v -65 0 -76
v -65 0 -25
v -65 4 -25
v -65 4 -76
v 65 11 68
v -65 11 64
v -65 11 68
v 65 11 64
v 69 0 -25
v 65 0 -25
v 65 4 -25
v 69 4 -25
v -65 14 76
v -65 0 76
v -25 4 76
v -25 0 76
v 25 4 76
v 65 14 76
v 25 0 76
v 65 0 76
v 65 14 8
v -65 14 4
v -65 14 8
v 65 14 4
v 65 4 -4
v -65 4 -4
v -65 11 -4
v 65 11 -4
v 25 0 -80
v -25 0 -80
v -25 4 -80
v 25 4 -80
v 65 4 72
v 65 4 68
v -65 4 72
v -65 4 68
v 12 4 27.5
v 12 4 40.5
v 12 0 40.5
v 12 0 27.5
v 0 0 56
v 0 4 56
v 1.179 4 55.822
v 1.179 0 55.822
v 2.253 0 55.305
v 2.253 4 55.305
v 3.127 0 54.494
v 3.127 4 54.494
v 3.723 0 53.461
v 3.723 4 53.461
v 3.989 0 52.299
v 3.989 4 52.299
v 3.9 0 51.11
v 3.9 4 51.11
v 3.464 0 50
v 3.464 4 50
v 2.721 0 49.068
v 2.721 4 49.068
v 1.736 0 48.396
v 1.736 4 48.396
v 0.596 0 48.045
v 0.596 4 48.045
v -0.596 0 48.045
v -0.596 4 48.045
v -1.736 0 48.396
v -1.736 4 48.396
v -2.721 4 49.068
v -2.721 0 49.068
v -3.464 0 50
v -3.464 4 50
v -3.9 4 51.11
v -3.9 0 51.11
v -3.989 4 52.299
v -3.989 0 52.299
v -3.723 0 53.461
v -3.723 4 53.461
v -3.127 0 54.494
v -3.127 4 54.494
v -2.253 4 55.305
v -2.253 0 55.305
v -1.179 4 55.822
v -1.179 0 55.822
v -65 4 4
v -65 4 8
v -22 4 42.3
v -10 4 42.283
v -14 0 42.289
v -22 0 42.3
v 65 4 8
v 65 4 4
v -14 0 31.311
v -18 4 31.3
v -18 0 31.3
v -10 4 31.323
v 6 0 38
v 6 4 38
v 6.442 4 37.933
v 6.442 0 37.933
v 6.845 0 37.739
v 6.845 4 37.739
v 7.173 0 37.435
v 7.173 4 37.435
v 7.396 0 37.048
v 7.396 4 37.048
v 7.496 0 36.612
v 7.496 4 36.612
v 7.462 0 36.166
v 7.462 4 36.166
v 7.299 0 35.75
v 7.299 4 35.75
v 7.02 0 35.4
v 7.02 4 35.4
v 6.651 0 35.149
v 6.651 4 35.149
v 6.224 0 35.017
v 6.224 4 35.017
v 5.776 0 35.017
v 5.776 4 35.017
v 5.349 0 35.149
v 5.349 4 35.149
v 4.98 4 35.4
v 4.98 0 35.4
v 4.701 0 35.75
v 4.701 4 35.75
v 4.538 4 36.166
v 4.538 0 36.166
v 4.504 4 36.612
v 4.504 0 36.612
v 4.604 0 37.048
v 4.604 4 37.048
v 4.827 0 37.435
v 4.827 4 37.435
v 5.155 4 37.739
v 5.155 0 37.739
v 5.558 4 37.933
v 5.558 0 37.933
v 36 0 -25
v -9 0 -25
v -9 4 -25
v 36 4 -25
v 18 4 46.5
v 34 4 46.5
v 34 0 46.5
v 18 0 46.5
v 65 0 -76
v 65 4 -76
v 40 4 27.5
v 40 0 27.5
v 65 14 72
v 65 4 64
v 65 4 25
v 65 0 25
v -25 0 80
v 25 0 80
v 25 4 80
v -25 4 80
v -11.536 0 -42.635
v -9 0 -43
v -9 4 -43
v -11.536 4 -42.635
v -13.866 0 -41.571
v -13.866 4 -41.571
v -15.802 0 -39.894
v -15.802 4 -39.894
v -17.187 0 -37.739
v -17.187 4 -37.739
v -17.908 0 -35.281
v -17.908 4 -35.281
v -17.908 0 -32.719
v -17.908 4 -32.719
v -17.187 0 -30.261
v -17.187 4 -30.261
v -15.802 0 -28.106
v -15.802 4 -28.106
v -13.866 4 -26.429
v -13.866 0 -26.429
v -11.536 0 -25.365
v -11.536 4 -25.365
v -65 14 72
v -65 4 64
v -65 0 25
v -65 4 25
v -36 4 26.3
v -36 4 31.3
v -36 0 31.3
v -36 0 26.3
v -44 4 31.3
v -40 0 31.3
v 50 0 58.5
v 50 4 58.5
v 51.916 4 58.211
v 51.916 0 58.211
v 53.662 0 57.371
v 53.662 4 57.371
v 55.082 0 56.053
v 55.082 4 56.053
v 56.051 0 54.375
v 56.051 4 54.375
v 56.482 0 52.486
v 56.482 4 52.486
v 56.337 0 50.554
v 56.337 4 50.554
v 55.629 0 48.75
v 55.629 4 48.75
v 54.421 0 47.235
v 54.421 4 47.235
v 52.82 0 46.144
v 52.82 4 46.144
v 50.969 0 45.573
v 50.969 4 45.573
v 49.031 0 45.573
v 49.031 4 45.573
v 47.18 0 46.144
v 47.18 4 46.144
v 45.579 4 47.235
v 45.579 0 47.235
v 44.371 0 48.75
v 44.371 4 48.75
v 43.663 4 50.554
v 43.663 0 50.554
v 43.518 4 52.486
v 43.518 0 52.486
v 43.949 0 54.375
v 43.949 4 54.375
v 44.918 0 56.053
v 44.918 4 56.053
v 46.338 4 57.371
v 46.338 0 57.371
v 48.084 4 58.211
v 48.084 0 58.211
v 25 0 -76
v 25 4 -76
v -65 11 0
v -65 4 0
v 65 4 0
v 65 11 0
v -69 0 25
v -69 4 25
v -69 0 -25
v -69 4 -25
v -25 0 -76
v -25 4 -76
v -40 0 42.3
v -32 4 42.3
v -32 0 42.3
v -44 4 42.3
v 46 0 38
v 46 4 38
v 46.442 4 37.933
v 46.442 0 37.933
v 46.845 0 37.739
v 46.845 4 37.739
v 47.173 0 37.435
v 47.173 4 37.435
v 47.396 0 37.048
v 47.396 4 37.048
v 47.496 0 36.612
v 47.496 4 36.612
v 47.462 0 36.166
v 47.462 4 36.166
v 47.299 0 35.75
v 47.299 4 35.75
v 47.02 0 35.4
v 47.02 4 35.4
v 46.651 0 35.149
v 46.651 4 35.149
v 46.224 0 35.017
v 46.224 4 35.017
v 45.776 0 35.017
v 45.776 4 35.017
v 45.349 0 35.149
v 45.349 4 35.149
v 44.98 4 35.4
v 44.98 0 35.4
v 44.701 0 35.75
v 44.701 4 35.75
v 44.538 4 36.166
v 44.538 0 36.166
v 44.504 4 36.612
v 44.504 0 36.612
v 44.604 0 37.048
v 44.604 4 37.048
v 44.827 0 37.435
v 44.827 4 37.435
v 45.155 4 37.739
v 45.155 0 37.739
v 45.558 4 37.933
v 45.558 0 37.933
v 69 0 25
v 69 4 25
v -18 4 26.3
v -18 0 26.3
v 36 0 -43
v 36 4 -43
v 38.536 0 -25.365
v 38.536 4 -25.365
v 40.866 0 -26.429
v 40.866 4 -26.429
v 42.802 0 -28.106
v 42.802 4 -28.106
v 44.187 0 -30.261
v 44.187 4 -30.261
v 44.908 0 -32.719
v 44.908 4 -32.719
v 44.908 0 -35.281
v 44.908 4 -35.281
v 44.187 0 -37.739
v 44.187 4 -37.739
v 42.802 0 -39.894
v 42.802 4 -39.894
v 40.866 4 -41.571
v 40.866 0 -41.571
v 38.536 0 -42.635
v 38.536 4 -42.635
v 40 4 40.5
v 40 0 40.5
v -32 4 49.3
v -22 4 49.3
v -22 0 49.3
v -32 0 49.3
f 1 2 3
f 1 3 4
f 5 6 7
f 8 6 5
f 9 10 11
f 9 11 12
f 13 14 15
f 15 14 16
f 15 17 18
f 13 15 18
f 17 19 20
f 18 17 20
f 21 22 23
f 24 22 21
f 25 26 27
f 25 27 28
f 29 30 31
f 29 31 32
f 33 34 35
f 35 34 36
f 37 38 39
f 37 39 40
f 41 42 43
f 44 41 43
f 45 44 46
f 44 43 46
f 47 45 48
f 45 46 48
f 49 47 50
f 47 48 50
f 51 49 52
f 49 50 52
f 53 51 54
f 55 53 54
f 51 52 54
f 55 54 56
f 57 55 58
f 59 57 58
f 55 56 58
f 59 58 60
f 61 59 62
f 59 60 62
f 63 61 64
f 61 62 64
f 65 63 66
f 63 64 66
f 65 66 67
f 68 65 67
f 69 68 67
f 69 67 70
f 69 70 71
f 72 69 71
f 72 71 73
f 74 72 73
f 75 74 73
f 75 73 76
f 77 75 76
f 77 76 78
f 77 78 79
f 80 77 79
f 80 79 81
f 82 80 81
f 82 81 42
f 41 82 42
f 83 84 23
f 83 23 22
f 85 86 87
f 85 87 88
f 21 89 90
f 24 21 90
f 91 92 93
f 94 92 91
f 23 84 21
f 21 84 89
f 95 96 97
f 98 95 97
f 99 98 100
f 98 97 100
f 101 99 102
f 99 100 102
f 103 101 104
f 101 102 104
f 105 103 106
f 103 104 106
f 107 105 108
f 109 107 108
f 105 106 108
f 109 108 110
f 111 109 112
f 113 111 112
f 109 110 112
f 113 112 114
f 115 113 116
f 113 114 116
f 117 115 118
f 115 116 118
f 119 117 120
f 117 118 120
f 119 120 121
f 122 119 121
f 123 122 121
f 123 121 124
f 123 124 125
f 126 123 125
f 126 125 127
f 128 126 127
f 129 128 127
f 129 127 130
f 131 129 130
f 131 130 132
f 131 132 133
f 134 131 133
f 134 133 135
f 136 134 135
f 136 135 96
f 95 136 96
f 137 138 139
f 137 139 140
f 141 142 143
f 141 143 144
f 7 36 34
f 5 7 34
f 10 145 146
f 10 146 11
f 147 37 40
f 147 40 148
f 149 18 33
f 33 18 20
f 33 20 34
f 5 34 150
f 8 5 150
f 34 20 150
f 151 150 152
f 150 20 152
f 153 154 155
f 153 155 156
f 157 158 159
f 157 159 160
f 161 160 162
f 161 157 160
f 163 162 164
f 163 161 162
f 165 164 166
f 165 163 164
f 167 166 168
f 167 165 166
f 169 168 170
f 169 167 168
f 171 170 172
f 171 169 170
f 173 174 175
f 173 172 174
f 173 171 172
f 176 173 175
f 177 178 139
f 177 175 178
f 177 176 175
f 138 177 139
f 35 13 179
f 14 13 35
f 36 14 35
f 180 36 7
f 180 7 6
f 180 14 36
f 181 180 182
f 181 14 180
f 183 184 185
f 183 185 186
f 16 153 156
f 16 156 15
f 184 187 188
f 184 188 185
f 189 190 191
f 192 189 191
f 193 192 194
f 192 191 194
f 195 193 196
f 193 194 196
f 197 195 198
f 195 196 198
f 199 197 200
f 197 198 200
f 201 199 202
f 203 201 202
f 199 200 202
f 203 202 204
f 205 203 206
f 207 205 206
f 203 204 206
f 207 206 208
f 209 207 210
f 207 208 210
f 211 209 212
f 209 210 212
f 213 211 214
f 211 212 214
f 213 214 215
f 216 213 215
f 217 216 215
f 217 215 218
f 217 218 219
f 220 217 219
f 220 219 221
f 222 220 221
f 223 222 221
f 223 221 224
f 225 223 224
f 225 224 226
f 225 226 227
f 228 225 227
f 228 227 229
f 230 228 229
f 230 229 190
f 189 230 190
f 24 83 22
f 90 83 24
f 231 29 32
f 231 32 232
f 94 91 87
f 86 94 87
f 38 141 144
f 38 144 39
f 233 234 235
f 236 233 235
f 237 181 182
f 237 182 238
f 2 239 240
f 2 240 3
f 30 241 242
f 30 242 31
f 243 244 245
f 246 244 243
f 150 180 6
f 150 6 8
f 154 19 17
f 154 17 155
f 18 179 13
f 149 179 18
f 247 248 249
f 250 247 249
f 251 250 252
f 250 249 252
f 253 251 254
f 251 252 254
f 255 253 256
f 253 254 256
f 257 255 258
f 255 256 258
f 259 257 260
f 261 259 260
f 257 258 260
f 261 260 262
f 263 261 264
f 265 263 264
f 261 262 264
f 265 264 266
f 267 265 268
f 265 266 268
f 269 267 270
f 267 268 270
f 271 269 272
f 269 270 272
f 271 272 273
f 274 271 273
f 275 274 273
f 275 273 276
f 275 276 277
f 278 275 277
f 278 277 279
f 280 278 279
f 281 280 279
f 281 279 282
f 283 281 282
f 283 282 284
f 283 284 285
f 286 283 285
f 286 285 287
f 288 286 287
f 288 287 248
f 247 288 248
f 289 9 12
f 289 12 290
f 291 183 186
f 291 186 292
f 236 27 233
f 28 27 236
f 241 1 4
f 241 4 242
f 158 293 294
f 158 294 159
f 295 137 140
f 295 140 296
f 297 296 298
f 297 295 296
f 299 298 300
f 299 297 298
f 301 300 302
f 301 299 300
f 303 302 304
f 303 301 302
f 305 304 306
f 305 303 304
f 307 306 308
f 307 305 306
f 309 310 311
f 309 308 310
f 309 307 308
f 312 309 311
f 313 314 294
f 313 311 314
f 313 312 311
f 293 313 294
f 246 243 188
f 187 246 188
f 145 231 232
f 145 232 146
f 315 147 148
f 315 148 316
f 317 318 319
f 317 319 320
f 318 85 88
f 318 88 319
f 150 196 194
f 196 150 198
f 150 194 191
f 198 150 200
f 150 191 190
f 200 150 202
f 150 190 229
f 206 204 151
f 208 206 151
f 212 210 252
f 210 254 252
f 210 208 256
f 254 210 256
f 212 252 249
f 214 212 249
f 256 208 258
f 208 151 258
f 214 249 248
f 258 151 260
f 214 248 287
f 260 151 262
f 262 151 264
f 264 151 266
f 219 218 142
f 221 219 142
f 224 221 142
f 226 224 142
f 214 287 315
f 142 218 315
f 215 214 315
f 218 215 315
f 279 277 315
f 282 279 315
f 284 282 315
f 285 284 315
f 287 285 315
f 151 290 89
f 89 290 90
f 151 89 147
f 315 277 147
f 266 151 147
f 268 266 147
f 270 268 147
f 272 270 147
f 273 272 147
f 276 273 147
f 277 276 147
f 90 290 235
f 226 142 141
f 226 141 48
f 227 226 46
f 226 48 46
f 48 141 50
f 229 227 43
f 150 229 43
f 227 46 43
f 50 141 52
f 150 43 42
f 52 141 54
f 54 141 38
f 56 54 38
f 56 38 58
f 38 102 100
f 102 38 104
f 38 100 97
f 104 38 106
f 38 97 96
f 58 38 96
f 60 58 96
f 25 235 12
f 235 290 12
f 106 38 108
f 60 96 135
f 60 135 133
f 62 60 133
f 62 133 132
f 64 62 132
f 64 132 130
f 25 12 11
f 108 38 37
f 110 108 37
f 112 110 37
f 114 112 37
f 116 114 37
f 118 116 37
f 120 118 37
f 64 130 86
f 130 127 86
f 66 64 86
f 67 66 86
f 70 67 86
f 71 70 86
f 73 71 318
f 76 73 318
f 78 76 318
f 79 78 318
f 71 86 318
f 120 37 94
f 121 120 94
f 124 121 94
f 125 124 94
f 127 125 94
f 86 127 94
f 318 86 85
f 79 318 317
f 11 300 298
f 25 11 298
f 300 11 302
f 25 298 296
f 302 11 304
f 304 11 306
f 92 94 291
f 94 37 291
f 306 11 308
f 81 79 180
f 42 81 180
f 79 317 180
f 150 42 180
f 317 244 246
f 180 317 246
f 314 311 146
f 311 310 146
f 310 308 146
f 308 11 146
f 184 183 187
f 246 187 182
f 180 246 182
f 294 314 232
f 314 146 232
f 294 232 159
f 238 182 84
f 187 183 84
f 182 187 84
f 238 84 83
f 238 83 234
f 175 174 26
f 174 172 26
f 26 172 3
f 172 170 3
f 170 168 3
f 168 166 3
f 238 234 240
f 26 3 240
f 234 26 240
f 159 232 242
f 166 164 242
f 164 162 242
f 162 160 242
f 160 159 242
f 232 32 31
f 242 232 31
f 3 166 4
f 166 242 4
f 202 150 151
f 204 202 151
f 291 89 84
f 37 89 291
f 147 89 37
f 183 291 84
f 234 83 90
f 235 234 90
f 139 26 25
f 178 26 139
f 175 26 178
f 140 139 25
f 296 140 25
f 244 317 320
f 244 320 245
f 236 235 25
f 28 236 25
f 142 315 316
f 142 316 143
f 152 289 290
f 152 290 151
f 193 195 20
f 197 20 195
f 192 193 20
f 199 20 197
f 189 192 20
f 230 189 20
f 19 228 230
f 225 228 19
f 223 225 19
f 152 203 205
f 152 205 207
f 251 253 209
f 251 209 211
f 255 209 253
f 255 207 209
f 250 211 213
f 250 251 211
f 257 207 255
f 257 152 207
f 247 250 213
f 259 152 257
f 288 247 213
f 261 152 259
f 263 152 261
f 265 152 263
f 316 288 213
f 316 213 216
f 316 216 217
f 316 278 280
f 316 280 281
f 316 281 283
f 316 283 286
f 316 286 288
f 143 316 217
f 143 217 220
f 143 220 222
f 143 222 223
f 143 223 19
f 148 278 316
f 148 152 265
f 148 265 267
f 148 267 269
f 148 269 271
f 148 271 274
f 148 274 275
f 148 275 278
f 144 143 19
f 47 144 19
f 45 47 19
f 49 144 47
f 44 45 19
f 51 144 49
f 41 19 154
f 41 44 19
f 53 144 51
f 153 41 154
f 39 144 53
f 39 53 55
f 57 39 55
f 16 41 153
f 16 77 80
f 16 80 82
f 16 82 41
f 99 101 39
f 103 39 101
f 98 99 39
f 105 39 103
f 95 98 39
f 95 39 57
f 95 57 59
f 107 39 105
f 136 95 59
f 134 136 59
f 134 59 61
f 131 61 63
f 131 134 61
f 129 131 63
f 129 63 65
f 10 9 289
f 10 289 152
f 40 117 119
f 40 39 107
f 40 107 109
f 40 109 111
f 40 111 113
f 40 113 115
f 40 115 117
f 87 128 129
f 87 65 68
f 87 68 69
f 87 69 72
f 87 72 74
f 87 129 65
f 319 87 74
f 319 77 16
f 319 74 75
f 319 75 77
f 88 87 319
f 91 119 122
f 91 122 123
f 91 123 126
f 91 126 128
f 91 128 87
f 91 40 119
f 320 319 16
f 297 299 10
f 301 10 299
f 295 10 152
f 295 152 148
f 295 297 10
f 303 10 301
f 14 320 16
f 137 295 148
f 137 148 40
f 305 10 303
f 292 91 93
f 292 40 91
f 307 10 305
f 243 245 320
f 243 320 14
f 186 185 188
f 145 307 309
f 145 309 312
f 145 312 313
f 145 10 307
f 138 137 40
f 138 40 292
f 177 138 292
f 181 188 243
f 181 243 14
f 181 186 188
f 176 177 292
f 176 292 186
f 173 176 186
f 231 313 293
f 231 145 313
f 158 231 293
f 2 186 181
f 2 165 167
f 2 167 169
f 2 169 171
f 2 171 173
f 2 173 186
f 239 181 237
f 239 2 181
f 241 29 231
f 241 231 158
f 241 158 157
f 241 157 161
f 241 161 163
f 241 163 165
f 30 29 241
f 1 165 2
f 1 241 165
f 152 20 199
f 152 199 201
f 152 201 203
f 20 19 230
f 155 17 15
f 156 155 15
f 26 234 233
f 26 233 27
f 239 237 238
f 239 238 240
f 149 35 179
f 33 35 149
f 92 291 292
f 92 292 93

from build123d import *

# Parameters (mm, degrees)
BOSS_EXTRUDE1_DEPTH = 4
SKETCH4_W           = 130
SKETCH4_H           = 4
BOSS_EXTRUDE2_DEPTH = 10
SKETCH5_W           = 130
SKETCH5_H           = 4
BOSS_EXTRUDE3_DEPTH = 7
SKETCH6_W           = 130
SKETCH6_H           = 4
BOSS_EXTRUDE4_DEPTH = 10
SKETCH8_W           = 130
SKETCH8_H           = 4
BOSS_EXTRUDE5_DEPTH = 7
CUT_EXTRUDE1_DEPTH  = 107.117859006
CHAMFER2_SIZE       = 4
CHAMFER3_SIZE       = 4
CUT_EXTRUDE3_DEPTH  = 107.117859006
SKETCH12_R          = 1.5
CUT_EXTRUDE4_DEPTH  = 107.117859006
SKETCH13_R          = 6.5
CUT_EXTRUDE5_DEPTH  = 107.117859006
SKETCH14_R          = 4
CUT_EXTRUDE6_DEPTH  = 107.117859006
CUT_EXTRUDE7_DEPTH  = 10


with BuildPart() as part:
    # Sketch3 → Boss-Extrude1 (new body)
    with BuildSketch(Plane(origin=(0, 0, 0), x_dir=(1, 0, 0), z_dir=(0, 1, 0))):
        Polygon((-25, 80), (25, 80), (25, 76), (65, 76), (65, 25), (69, 25), (69, -25), (65, -25), (65, -76), (25, -76), (25, -80), (-25, -80), (-25, -76), (-65, -76), (-65, -25), (-69, -25), (-69, 25), (-65, 25), (-65, 76), (-25, 76), align=None)
    extrude(amount=BOSS_EXTRUDE1_DEPTH)

    # Sketch4 → Boss-Extrude2 (add)
    with BuildSketch(Plane(origin=(0, 4, 0), x_dir=(1, 0, 0), z_dir=(0, 1, 0))):
        with Locations((0, -74)):
            Rectangle(SKETCH4_W, SKETCH4_H)
    extrude(amount=BOSS_EXTRUDE2_DEPTH)

    # Sketch5 → Boss-Extrude3 (add)
    with BuildSketch(Plane(origin=(0, 4, 0), x_dir=(1, 0, 0), z_dir=(0, 1, 0))):
        with Locations((0, -66)):
            Rectangle(SKETCH5_W, SKETCH5_H)
    extrude(amount=BOSS_EXTRUDE3_DEPTH)

    # Sketch6 → Boss-Extrude4 (add)
    with BuildSketch(Plane(origin=(0, 4, 0), x_dir=(1, 0, 0), z_dir=(0, 1, 0))):
        with Locations((0, -6)):
            Rectangle(SKETCH6_W, SKETCH6_H)
    extrude(amount=BOSS_EXTRUDE4_DEPTH)

    # Sketch8 → Boss-Extrude5 (add)
    with BuildSketch(Plane(origin=(0, 4, 0), x_dir=(1, 0, 0), z_dir=(0, 1, 0))):
        with Locations((0, 2)):
            Rectangle(SKETCH8_W, SKETCH8_H)
    extrude(amount=BOSS_EXTRUDE5_DEPTH)

    # Sketch9 → Cut-Extrude1 (cut, through all)
    with BuildSketch(Plane(origin=(0, 4, 0), x_dir=(1, 0, 0), z_dir=(0, 1, 0))):
        Polygon((-21.999983798, -49.3), (-31.999983798, -49.3), (-31.999983798, -42.3), (-40, -42.3), (-40, -31.3), (-35.999983798, -31.3), (-35.999983798, -26.3), (-17.999983798, -26.3), (-17.999983798, -31.3), (-14, -31.311384755), (-14, -42.288615245), (-22, -42.3), align=None)
    extrude(amount=-CUT_EXTRUDE1_DEPTH, mode=Mode.SUBTRACT)

    # Chamfer2
    chamfer2_edges = [part.edges().sort_by_distance(p)[0] for p in [
        (-40, 4, 36.8),
    ]]
    chamfer(chamfer2_edges, length=CHAMFER2_SIZE - 0.0001)  # a hair under: the kernel refuses the full size

    # Chamfer3
    chamfer3_edges = [part.edges().sort_by_distance(p)[0] for p in [
        (-14, 4, 36.8),
    ]]
    chamfer(chamfer3_edges, length=CHAMFER3_SIZE - 0.0001)  # a hair under: the kernel refuses the full size

    # Sketch11 → Cut-Extrude3 (cut, through all)
    with BuildSketch(Plane(origin=(0, 4, 0), x_dir=(1, 0, 0), z_dir=(0, 1, 0))):
        Polygon((12, -27.5), (40, -27.5), (40, -40.5), (34, -46.5), (18, -46.5), (12, -40.5), align=None)
    extrude(amount=-CUT_EXTRUDE3_DEPTH, mode=Mode.SUBTRACT)

    # Sketch12 → Cut-Extrude4 (cut, through all)
    with BuildSketch(Plane(origin=(0, 4, 0), x_dir=(1, 0, 0), z_dir=(0, 1, 0))):
        with Locations(Location((6, -36.5, 0), (0, 0, 270))):
            Circle(SKETCH12_R)
        with Locations(Location((46, -36.5, 0), (0, 0, 270))):
            Circle(SKETCH12_R)
    extrude(amount=-CUT_EXTRUDE4_DEPTH, mode=Mode.SUBTRACT)

    # Sketch13 → Cut-Extrude5 (cut, through all)
    with BuildSketch(Plane(origin=(0, 4, 0), x_dir=(1, 0, 0), z_dir=(0, 1, 0))):
        with Locations(Location((50, -52, 0), (0, 0, 270))):
            Circle(SKETCH13_R)
    extrude(amount=-CUT_EXTRUDE5_DEPTH, mode=Mode.SUBTRACT)

    # Sketch14 → Cut-Extrude6 (cut, through all)
    with BuildSketch(Plane(origin=(0, 4, 0), x_dir=(1, 0, 0), z_dir=(0, 1, 0))):
        with Locations(Location((0, -52, 0), (0, 0, 270))):
            Circle(SKETCH14_R)
    extrude(amount=-CUT_EXTRUDE6_DEPTH, mode=Mode.SUBTRACT)

    # Sketch15 → Cut-Extrude7 (cut)
    with BuildSketch(Plane.XZ):
        with BuildLine():
            Line((-9, -25), (36, -25))
            ThreePointArc((36, -25), (45, -34), (36, -43))
            Line((36, -43), (-9, -43))
            ThreePointArc((-9, -43), (-18, -34), (-9, -25))
        make_face()
    extrude(amount=-CUT_EXTRUDE7_DEPTH, mode=Mode.SUBTRACT)


solid = part.part
